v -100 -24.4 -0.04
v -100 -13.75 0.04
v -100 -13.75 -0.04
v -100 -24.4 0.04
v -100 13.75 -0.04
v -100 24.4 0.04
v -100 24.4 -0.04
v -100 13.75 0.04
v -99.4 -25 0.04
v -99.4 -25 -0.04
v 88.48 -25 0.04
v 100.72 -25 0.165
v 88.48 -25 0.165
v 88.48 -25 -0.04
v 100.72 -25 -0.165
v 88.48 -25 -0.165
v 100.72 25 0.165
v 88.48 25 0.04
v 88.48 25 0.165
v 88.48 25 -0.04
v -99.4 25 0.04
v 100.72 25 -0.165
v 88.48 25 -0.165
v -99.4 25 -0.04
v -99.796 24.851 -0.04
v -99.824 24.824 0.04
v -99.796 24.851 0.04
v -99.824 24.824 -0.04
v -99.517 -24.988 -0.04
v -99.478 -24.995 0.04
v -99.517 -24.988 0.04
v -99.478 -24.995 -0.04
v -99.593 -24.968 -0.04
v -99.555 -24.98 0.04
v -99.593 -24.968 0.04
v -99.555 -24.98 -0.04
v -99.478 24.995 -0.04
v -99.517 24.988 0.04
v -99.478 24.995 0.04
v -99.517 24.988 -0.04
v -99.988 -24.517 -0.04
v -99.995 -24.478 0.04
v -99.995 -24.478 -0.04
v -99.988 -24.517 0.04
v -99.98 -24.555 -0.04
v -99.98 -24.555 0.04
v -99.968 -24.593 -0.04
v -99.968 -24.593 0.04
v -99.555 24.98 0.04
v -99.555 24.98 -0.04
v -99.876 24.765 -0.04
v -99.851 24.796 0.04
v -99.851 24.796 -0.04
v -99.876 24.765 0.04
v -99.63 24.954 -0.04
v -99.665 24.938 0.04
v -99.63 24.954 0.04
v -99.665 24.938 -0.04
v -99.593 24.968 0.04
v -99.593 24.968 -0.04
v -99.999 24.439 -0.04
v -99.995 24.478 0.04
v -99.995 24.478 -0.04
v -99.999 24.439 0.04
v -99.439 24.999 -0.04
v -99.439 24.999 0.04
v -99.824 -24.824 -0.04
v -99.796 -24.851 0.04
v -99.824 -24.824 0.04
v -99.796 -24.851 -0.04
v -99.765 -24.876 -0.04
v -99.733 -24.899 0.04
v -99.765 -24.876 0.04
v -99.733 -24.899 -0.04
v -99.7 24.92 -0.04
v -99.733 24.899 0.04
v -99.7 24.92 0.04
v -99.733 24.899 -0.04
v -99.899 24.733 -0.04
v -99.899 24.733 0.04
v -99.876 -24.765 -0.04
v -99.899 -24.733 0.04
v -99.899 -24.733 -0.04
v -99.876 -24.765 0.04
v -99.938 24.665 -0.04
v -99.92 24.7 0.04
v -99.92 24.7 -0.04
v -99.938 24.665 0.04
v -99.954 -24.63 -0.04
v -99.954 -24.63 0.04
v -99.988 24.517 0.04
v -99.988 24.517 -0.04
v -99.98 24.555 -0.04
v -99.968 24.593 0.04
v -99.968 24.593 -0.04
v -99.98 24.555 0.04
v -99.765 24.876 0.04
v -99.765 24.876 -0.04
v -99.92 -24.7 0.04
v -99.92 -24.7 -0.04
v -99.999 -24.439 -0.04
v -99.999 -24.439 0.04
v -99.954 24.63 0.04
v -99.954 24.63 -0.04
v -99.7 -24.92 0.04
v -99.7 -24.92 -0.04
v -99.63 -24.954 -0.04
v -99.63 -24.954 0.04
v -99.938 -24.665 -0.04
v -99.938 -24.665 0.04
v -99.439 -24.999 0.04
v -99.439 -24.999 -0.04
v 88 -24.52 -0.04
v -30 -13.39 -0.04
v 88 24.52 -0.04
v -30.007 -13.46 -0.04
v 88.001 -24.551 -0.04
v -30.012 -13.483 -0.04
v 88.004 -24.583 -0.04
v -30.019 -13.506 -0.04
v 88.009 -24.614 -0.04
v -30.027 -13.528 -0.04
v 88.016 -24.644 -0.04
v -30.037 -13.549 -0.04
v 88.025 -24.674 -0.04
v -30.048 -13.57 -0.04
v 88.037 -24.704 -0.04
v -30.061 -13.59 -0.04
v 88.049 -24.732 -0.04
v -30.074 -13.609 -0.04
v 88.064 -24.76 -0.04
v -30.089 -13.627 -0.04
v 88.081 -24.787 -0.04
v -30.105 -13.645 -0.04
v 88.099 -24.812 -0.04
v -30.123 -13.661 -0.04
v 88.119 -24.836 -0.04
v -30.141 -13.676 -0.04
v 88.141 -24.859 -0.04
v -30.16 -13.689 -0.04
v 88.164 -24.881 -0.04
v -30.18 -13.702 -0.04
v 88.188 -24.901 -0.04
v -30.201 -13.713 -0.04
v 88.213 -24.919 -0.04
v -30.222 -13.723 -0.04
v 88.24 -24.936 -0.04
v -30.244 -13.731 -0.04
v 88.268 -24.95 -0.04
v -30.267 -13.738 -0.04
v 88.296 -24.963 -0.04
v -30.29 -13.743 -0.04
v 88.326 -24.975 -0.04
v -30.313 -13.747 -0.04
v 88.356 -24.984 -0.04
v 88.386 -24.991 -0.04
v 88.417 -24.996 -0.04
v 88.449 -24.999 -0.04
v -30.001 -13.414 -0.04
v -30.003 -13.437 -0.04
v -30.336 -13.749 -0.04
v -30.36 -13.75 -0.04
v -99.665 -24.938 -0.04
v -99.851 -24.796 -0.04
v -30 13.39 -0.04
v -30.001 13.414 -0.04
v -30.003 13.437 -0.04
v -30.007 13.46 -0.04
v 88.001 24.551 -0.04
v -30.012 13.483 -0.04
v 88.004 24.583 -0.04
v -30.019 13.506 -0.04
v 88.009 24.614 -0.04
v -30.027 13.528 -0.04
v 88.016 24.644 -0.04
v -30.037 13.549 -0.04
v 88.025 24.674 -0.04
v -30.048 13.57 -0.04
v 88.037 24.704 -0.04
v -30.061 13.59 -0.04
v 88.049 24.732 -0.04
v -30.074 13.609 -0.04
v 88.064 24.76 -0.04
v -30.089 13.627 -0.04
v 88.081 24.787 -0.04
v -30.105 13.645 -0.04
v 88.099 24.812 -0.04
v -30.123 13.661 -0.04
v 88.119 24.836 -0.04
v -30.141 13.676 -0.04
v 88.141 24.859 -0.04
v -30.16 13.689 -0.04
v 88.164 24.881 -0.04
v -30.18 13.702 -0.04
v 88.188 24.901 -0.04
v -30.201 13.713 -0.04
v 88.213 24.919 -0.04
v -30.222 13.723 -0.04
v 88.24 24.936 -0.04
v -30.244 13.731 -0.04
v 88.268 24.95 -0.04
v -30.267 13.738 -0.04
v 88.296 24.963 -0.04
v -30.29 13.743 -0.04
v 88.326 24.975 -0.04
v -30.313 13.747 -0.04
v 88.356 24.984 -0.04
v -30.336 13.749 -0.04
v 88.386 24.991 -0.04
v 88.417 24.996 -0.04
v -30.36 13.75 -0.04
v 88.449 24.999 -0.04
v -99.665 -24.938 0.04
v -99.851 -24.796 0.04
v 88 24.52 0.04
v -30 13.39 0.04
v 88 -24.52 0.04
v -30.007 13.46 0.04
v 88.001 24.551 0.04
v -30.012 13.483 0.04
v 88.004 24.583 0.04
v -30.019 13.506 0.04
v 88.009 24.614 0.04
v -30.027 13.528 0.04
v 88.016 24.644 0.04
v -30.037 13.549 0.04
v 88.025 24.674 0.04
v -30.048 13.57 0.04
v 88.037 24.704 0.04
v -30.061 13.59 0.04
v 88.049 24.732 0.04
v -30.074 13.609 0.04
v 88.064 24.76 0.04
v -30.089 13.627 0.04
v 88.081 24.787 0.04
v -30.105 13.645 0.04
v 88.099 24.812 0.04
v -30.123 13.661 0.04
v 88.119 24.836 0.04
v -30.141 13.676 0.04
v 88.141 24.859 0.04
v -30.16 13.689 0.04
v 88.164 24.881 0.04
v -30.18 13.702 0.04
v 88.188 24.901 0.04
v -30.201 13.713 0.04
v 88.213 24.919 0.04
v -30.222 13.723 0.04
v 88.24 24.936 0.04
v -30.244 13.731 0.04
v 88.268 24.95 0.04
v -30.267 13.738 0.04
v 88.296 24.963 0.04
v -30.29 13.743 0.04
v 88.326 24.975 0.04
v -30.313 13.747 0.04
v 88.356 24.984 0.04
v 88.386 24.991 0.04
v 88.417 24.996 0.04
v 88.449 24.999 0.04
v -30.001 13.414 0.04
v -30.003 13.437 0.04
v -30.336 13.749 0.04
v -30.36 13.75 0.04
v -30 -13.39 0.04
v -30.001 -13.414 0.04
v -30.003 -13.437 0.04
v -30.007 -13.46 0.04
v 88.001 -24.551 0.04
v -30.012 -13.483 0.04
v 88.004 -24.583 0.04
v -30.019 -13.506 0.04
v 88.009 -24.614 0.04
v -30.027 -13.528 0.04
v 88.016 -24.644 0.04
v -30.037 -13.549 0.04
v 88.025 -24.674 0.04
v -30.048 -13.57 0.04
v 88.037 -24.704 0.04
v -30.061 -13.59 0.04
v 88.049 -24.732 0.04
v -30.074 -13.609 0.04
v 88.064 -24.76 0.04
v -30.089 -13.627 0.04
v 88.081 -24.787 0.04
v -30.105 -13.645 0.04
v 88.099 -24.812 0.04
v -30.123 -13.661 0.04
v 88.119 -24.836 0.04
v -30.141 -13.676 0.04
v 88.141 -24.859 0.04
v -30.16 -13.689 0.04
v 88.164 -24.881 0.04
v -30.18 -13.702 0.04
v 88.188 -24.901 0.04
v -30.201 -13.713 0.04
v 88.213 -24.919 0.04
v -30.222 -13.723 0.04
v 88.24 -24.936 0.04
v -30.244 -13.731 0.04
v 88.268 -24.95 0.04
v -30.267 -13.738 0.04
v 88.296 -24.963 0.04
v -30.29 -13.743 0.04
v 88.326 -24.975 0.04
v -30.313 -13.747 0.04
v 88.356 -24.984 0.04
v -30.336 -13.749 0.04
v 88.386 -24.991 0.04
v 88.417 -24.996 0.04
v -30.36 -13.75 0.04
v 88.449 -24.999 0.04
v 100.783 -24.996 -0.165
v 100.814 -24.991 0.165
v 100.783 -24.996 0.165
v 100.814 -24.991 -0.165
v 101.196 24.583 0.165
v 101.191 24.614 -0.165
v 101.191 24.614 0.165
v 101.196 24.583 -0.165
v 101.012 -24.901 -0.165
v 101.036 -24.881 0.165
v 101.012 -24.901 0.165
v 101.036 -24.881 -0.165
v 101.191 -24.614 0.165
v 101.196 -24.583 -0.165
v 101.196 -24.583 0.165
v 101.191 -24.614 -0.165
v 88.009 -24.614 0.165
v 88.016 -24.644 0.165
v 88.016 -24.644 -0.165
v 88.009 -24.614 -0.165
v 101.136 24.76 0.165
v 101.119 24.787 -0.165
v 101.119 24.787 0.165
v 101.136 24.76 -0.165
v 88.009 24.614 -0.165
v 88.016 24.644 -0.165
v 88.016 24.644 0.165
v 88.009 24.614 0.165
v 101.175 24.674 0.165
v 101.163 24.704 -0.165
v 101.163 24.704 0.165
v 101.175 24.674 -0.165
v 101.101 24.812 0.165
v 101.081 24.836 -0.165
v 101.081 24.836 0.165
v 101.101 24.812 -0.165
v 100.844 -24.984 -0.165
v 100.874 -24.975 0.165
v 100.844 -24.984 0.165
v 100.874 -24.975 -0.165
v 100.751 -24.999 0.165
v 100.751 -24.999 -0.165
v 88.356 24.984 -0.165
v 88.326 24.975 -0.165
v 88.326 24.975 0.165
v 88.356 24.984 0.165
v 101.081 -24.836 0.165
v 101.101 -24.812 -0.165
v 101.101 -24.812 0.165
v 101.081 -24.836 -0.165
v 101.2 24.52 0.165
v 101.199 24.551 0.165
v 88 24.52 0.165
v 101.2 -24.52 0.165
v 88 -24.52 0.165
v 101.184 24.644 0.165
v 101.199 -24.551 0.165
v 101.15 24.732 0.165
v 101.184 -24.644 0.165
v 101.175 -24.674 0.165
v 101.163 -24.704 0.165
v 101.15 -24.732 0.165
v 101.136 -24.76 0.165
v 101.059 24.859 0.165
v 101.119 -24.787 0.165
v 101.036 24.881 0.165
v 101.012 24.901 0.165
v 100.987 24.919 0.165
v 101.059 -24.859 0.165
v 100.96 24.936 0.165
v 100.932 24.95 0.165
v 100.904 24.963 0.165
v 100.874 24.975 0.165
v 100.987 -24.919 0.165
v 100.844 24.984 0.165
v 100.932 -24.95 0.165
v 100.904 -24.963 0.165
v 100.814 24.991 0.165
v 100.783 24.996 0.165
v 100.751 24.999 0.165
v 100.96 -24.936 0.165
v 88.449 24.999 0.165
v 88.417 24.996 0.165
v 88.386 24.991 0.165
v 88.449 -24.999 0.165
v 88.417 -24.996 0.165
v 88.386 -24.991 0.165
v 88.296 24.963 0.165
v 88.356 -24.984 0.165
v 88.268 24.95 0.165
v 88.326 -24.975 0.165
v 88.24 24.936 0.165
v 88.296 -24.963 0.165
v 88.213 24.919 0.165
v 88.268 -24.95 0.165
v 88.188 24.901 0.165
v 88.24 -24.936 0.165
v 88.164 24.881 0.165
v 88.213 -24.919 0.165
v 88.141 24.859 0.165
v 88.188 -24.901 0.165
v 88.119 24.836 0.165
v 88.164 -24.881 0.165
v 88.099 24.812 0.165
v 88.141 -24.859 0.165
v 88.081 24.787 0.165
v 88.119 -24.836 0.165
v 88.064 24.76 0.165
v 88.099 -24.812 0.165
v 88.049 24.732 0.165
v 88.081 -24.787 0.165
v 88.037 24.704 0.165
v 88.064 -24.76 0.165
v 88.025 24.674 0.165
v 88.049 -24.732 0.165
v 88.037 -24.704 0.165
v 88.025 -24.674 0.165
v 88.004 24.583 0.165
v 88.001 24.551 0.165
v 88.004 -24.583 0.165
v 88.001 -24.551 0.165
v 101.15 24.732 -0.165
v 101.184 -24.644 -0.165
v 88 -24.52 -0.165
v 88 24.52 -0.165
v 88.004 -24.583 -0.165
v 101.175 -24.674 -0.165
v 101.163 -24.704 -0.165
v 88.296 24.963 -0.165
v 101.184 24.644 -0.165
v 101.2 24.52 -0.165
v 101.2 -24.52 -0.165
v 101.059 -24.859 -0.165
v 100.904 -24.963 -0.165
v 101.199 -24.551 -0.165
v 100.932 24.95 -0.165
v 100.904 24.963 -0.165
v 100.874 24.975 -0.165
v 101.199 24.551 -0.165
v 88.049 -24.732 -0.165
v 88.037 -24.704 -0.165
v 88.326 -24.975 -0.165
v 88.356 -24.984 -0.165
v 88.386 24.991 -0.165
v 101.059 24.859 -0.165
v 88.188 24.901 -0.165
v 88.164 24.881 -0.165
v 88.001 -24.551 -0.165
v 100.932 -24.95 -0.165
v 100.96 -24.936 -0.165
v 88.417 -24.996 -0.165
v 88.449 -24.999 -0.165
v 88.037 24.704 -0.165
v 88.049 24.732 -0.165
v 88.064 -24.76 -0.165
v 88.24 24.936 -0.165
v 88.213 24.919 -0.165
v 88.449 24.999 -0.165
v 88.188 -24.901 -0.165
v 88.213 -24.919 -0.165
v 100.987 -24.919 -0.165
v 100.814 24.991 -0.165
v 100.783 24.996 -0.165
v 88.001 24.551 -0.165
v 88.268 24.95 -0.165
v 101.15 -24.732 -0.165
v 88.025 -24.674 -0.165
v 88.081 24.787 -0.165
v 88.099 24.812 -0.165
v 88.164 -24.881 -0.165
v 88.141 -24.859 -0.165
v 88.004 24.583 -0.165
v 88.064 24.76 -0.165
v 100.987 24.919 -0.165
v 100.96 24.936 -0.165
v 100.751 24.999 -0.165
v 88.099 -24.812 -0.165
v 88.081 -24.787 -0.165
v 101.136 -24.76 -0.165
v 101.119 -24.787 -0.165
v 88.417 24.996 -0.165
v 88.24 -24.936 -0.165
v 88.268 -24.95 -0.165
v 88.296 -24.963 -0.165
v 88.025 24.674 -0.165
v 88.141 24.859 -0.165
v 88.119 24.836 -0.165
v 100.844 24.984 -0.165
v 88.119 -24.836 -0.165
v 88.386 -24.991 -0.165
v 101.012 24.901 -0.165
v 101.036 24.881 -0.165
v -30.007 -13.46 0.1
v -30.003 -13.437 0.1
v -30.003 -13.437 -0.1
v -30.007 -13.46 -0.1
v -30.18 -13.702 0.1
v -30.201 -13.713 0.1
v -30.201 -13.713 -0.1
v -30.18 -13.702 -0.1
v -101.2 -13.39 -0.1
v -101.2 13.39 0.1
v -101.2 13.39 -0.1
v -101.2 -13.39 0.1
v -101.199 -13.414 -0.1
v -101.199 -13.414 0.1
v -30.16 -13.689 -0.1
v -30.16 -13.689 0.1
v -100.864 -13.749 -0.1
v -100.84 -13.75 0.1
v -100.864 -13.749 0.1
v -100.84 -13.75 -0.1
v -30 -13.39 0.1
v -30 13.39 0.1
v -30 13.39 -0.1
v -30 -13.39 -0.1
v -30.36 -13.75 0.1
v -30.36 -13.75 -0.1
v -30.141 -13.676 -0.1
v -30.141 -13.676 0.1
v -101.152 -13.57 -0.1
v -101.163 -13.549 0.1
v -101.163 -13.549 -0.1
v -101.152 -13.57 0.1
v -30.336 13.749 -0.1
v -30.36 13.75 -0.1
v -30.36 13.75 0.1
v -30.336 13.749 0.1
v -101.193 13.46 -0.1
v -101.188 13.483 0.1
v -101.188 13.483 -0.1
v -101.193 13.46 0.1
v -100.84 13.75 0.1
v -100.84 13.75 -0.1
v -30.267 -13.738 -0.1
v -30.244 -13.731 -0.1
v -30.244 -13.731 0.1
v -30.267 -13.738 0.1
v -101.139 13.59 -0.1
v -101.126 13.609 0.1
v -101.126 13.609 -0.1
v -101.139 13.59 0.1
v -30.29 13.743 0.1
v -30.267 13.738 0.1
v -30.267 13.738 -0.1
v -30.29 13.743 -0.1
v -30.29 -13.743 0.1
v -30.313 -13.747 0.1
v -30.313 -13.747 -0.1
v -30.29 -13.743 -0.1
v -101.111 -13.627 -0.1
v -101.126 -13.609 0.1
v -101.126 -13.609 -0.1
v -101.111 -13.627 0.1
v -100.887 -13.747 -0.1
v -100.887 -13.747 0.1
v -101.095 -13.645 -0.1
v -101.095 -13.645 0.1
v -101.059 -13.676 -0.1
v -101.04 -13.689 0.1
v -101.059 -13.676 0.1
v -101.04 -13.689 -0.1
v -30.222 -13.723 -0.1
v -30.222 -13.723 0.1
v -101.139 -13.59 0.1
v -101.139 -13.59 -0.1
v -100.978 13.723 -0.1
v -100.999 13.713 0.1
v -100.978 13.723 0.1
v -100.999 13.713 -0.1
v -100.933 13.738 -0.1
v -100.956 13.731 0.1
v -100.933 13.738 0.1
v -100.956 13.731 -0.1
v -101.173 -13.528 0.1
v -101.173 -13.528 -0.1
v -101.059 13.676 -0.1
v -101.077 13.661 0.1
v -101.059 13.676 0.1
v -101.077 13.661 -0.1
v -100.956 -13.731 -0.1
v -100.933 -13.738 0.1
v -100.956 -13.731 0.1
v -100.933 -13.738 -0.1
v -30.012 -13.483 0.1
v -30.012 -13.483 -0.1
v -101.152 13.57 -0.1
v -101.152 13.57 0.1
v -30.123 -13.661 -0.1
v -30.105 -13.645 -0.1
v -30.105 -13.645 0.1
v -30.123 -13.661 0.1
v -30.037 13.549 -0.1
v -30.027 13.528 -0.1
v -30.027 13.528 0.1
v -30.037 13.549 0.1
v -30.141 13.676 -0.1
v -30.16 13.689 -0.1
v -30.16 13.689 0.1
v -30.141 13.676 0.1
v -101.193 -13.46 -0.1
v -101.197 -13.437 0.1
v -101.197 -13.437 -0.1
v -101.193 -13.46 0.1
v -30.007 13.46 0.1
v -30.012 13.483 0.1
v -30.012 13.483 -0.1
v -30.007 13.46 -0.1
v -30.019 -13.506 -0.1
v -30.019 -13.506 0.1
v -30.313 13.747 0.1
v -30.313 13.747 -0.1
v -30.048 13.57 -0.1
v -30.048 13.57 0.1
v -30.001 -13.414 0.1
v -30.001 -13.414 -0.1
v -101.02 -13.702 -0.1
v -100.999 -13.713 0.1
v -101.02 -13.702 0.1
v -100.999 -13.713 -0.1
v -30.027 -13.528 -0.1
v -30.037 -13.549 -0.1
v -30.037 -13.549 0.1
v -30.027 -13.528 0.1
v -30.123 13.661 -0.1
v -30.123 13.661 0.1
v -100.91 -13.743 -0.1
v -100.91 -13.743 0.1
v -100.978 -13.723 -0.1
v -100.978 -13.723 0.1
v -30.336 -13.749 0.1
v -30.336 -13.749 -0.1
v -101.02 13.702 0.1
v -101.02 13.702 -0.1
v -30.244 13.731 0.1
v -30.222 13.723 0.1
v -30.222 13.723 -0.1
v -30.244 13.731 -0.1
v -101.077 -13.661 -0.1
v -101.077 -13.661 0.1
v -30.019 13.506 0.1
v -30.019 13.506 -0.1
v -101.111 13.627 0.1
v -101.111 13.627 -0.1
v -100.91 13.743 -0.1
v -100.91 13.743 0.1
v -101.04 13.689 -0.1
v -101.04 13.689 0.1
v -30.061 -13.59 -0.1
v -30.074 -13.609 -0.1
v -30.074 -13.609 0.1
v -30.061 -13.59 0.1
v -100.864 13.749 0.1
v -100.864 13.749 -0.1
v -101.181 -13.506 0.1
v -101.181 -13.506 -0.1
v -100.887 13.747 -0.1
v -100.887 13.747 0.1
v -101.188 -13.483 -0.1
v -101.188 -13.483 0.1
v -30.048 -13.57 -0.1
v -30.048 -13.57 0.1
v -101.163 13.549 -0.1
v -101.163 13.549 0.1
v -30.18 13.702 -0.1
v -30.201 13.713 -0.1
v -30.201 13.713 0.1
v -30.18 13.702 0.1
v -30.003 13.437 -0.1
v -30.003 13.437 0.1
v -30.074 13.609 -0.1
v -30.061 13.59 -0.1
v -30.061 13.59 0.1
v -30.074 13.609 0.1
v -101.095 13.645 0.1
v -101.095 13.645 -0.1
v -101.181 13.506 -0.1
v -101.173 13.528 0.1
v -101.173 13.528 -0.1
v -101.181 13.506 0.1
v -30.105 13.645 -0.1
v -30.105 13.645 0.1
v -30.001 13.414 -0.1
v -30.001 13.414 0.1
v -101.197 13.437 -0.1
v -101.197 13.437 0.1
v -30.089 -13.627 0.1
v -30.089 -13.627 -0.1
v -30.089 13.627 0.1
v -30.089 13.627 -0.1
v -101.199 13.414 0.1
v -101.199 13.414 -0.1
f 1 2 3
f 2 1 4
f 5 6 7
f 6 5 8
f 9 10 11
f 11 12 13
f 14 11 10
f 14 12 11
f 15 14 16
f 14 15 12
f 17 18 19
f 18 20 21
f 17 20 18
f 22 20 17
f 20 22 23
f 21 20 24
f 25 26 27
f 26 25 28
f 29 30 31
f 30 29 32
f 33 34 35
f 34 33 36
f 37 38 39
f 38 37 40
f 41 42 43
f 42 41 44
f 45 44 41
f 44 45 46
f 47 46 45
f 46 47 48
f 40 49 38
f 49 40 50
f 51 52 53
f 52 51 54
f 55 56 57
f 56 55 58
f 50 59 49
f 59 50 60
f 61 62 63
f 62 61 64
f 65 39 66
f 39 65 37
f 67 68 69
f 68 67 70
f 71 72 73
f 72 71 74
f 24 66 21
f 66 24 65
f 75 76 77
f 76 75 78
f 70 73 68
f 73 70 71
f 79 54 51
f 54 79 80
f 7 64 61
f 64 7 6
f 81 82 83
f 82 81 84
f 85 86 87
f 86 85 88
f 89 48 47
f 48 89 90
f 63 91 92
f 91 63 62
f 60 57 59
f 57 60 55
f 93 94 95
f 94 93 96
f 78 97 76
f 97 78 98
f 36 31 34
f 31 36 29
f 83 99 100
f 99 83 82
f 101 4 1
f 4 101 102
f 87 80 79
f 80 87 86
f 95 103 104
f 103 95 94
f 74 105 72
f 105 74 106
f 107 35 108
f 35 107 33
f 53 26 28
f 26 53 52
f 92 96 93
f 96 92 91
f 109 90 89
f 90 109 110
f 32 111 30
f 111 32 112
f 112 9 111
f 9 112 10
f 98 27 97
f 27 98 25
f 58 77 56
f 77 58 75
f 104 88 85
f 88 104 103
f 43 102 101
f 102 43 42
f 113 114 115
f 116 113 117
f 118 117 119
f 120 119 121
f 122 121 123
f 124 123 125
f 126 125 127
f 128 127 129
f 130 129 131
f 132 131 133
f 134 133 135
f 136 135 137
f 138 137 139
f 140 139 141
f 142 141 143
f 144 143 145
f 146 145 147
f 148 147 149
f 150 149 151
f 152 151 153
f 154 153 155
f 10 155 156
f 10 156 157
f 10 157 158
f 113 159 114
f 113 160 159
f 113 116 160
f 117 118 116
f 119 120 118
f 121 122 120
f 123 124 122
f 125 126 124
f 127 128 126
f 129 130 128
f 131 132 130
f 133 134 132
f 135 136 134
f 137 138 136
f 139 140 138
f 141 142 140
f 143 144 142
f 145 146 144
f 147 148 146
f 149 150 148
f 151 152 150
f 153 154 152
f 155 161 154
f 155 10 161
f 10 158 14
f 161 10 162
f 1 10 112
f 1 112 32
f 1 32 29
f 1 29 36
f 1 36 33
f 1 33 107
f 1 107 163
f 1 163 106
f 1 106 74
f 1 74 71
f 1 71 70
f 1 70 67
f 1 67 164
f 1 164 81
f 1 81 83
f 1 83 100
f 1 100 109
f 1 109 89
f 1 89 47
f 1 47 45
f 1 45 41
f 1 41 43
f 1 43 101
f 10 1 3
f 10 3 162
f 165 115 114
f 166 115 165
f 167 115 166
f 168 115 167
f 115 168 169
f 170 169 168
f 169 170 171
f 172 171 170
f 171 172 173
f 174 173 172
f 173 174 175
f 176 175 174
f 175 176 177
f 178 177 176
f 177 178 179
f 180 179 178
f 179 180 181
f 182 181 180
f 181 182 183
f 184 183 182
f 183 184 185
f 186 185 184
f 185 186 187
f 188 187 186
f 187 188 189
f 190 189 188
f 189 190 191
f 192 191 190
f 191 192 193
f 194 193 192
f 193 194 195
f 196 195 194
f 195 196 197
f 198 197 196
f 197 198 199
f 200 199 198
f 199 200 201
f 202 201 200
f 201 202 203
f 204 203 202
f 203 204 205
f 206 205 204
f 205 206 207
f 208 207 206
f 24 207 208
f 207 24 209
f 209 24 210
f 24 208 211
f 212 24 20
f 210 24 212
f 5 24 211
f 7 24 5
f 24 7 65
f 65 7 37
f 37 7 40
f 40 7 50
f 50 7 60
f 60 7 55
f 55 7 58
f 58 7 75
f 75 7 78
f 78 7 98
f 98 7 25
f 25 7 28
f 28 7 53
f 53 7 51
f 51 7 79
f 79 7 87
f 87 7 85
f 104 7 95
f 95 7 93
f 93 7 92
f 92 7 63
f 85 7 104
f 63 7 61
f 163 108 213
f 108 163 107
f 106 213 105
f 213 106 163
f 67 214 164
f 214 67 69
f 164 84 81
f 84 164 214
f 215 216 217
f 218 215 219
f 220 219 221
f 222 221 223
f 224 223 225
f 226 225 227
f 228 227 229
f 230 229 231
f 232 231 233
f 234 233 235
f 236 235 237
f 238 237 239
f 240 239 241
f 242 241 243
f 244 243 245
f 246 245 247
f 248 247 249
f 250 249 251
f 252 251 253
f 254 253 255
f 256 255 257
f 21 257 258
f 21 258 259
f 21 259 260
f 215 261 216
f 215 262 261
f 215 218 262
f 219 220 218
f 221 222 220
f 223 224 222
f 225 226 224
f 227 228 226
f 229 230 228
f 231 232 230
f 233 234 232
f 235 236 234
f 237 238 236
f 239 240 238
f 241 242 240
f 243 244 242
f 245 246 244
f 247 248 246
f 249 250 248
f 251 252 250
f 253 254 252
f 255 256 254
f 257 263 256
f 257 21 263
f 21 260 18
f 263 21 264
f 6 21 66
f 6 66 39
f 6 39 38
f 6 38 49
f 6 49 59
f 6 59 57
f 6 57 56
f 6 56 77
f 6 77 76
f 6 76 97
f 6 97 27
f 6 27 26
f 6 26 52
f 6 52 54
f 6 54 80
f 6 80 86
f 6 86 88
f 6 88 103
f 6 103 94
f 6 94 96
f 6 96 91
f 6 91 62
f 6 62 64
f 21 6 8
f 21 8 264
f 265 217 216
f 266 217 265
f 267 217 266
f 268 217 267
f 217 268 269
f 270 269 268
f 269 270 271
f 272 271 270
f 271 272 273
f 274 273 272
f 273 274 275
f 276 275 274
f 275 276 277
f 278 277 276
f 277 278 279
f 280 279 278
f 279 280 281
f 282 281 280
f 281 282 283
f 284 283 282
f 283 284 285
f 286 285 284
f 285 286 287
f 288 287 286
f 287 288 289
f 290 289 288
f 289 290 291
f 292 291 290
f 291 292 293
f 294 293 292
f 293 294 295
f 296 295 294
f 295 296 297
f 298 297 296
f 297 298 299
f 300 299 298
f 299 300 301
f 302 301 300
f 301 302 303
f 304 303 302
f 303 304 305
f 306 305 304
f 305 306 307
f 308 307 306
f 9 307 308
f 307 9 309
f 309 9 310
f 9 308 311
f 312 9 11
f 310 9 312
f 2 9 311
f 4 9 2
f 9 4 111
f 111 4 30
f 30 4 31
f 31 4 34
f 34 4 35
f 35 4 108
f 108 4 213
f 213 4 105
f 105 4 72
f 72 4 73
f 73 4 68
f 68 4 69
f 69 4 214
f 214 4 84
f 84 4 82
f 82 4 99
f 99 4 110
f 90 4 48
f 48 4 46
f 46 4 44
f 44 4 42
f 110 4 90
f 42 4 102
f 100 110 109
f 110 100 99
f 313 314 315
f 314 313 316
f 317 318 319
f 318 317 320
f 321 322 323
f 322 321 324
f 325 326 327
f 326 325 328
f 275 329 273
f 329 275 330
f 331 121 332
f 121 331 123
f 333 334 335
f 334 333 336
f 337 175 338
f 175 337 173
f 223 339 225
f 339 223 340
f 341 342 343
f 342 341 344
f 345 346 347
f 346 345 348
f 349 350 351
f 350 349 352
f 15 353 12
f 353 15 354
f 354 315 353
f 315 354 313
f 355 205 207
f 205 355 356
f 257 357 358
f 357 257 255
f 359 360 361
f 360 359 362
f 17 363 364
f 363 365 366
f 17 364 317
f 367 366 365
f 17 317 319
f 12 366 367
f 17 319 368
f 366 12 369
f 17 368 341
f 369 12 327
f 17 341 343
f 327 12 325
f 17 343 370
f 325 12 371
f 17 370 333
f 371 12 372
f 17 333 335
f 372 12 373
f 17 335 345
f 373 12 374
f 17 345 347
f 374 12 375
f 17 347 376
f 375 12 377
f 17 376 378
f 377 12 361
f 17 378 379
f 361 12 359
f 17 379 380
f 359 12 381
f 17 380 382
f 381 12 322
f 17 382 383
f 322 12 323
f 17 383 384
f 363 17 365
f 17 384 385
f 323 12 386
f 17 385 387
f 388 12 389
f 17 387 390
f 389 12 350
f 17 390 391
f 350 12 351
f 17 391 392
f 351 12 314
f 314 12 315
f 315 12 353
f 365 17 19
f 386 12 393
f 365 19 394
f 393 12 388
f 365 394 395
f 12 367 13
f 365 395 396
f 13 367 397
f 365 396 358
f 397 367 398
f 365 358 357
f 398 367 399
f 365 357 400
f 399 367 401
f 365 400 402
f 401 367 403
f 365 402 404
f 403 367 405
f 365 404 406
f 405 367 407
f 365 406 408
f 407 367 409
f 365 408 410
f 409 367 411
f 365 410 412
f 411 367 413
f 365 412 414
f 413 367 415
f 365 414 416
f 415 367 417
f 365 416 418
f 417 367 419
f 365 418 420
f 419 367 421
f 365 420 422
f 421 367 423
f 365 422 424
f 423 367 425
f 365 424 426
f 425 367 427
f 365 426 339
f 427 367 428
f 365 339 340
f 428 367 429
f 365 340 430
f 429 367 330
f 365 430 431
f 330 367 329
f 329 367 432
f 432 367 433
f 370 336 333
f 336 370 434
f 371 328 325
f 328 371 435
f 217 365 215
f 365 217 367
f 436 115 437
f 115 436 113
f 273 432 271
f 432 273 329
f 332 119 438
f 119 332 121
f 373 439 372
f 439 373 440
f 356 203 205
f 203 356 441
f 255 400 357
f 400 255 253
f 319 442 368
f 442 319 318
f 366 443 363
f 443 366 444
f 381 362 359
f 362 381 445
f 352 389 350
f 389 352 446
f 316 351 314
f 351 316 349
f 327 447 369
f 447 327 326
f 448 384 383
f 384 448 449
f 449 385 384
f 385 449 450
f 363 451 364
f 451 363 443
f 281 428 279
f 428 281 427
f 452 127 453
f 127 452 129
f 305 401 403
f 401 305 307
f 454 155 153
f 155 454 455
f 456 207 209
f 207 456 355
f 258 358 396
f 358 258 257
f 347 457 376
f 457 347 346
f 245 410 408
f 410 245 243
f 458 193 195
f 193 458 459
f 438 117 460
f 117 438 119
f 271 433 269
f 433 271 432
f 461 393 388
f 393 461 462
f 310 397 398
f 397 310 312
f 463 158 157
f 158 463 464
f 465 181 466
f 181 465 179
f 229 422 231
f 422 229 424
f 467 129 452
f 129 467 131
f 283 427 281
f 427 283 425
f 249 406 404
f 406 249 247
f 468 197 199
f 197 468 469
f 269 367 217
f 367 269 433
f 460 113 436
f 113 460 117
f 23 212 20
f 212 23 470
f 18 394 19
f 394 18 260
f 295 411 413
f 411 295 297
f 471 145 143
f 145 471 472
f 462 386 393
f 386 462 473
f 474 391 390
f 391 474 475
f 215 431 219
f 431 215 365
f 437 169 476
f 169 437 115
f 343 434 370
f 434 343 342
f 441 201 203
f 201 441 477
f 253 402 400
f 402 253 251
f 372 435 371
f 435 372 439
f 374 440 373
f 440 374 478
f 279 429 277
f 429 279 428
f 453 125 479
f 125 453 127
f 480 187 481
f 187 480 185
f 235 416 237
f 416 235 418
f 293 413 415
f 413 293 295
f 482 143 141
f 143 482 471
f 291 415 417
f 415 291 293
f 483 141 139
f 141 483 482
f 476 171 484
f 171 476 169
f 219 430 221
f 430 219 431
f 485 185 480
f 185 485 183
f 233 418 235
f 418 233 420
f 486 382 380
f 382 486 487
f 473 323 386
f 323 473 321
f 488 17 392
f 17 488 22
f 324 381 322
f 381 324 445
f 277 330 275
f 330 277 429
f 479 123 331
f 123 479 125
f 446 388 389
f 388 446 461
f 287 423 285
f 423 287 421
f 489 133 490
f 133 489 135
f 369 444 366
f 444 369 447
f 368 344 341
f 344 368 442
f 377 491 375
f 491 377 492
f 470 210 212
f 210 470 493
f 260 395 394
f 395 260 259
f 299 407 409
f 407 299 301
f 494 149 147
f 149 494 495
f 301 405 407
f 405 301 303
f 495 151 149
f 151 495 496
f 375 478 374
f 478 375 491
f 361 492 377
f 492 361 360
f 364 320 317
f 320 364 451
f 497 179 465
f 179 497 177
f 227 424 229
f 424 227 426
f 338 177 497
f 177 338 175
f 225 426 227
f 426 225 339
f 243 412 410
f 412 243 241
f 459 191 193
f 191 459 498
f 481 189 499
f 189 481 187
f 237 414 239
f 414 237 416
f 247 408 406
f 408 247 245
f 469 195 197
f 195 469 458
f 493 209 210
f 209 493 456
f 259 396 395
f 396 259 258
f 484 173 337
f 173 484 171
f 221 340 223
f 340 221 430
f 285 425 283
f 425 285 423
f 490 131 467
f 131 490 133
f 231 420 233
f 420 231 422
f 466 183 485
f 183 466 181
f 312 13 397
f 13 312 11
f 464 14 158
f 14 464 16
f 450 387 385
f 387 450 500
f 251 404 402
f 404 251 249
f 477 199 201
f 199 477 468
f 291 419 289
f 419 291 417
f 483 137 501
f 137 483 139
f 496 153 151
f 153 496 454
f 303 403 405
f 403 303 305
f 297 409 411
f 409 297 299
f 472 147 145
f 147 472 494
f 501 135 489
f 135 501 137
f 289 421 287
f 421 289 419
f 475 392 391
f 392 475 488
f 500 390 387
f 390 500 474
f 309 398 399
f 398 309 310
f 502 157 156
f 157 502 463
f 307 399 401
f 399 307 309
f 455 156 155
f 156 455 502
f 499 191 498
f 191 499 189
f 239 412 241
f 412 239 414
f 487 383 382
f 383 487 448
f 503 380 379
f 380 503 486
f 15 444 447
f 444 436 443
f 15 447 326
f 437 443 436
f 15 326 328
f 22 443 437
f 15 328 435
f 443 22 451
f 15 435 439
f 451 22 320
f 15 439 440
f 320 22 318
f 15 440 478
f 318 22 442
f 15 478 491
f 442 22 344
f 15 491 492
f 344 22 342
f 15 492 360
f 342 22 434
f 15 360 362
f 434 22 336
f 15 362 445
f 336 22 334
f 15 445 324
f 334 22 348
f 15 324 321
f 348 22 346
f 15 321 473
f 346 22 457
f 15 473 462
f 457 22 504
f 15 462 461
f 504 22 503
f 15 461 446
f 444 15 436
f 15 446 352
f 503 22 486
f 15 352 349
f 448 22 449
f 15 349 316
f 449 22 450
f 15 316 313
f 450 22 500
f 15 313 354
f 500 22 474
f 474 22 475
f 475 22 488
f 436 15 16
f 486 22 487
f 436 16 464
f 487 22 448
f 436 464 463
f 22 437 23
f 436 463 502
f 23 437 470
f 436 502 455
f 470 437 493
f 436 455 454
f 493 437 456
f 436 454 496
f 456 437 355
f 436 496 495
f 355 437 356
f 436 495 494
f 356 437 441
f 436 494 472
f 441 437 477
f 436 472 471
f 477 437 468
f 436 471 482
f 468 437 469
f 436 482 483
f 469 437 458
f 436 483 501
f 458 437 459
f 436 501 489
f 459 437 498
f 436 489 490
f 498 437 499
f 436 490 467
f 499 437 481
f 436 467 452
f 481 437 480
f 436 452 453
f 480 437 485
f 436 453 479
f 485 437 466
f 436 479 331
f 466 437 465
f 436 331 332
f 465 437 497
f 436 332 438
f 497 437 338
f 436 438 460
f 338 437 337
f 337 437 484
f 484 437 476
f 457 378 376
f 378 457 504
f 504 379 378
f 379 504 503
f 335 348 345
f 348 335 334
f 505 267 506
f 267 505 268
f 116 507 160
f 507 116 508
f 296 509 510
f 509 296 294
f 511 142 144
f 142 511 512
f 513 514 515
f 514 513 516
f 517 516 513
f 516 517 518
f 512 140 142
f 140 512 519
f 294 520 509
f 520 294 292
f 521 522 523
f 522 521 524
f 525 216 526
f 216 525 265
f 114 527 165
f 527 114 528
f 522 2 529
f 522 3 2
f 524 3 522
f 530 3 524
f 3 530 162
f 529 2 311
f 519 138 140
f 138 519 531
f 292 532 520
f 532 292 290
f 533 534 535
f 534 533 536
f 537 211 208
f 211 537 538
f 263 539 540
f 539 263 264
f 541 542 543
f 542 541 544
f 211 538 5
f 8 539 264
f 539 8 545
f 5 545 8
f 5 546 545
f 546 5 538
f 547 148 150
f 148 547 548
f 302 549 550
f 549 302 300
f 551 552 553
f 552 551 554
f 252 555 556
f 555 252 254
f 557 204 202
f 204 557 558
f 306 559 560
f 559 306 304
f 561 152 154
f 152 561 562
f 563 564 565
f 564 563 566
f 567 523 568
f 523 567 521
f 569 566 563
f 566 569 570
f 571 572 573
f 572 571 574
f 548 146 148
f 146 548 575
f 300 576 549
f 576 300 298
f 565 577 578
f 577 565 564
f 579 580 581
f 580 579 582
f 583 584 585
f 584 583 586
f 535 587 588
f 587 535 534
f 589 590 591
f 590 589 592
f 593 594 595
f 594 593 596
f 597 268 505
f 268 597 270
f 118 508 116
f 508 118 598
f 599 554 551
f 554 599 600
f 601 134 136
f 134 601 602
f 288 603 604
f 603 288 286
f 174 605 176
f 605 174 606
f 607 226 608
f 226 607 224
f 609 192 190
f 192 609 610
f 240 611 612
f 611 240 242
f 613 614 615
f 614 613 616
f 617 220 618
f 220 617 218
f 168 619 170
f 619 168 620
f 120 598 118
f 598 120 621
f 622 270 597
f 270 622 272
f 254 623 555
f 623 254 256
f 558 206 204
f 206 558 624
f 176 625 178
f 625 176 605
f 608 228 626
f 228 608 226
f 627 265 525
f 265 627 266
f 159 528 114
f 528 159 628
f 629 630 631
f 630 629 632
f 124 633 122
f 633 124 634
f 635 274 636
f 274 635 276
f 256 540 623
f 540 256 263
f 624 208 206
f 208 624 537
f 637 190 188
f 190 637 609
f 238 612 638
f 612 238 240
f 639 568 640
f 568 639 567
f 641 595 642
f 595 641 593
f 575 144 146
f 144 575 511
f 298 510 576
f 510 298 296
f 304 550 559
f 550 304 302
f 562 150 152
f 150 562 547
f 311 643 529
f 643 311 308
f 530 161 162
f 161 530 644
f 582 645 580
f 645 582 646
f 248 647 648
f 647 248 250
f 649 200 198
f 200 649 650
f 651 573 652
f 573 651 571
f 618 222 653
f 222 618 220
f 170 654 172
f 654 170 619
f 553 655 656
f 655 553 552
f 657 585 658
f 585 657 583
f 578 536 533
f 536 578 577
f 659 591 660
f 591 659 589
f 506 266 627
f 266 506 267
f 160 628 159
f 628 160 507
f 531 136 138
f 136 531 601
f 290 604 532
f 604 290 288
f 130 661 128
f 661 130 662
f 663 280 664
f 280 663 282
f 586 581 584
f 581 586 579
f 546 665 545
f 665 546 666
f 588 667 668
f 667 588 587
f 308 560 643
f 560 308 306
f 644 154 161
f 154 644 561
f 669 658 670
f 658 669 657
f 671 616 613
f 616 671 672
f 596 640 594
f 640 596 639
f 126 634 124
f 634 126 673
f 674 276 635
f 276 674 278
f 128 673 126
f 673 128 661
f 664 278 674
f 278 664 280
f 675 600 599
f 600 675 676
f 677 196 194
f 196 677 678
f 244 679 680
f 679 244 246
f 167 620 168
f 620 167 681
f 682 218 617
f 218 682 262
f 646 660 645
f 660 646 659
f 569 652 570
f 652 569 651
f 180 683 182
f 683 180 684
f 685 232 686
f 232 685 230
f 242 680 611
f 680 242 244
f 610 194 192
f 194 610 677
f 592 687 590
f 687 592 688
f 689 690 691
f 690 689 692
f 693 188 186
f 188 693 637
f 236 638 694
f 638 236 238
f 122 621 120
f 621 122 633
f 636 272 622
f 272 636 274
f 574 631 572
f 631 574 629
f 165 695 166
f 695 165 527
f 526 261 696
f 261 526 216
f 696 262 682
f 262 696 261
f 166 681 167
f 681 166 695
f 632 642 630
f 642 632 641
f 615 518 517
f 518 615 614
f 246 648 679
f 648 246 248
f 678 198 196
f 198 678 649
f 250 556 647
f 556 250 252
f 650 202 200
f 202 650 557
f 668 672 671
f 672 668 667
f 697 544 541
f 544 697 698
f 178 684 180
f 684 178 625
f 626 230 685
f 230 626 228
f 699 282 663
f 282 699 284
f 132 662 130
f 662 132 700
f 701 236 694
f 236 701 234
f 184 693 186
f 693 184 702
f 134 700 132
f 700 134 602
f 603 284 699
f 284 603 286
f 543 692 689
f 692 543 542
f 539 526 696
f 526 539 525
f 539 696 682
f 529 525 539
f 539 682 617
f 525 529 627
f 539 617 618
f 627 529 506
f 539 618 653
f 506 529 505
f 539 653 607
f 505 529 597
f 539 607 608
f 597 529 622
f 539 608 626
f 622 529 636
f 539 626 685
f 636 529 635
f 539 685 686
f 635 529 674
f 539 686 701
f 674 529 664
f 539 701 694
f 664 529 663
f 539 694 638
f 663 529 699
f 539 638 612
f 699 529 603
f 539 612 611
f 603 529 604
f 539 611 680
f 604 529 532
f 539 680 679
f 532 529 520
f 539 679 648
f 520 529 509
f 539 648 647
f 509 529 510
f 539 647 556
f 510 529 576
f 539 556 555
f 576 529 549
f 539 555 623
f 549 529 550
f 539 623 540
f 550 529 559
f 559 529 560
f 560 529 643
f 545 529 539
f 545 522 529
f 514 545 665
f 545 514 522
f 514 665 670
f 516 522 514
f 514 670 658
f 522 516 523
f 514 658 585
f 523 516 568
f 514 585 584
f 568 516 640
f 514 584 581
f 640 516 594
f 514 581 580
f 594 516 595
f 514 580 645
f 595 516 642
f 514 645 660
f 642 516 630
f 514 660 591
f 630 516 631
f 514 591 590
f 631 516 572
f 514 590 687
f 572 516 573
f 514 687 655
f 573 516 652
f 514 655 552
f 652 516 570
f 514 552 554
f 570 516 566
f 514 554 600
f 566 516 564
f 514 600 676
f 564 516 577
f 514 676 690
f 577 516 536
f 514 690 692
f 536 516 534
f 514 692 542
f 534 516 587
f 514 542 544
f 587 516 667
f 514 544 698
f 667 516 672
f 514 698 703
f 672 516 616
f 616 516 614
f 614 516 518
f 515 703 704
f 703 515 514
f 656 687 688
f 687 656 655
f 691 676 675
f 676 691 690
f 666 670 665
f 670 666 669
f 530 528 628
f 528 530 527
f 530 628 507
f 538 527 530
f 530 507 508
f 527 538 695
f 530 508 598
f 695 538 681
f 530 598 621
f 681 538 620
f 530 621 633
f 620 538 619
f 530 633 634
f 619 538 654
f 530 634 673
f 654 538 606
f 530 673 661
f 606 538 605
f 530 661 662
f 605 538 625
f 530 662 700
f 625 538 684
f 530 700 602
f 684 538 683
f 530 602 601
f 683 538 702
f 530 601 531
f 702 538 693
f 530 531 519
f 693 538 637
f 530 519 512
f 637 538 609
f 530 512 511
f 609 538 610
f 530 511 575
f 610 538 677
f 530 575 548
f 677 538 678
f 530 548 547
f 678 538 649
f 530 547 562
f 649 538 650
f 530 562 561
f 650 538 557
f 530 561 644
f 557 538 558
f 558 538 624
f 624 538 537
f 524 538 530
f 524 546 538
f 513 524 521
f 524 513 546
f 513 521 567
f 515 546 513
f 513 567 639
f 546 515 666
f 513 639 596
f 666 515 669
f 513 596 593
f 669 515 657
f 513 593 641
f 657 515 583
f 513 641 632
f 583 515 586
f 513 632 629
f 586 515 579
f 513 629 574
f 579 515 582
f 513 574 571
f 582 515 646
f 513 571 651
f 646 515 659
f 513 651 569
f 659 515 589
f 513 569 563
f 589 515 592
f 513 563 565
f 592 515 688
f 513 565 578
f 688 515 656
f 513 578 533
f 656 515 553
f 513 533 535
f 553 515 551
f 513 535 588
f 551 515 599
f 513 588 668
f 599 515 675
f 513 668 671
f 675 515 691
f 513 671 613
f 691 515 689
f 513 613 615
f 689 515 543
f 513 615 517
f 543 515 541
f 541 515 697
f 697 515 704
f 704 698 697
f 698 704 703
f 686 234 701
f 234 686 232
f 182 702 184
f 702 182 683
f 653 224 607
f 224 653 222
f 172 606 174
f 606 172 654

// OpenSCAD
$fn = 96;

// A sheet: Aluminium foil tape (single connected solid)
// Replaces roll/spool with a thin rectangular sheet/strip of foil tape.

//////////////////////
// User parameters
//////////////////////
tape_width      = 50;    // mm (across the tape)
tape_length     = 200;   // mm (along the tape)
tape_thickness  = 0.08;  // mm (foil tape thickness, visual)
edge_chamfer    = 0.6;   // mm (softened edges, simplified)
overlap         = 1.2;   // mm (intentional overlap to ensure watertight union)

//////////////////////
// Helpers
//////////////////////
module rounded_sheet(L, W, T, r) {
    // Simple rounded-rectangle prism using hull of corner cylinders.
    // Ensures a clean sheet silhouette without fine details.
    rr = min(r, W/2 - 0.01, L/2 - 0.01);
    hull() {
        for (sx = [-1, 1], sy = [-1, 1]) {
            translate([sx*(L/2 - rr), sy*(W/2 - rr), 0])
                cylinder(r=rr, h=T, center=true);
        }
    }
}

module foil_tape_sheet() {
    // Main sheet body
    rounded_sheet(tape_length, tape_width, tape_thickness, edge_chamfer);

    // Slightly thicker "folded/raised" leading edge to read as foil tape sheet
    // Connected by overlap (no floating parts).
    lip_len = max(8, tape_length * 0.06);
    lip_thk = tape_thickness + 0.25; // subtle raised edge
    translate([tape_length/2 - lip_len/2 + overlap/2, 0, 0])
        rounded_sheet(lip_len + overlap, tape_width, lip_thk, edge_chamfer*0.8);

    // Subtle backing/adhesive hint as a shallow band on the underside (still one solid)
    // Implemented as a very thin rib that overlaps into the main sheet.
    band_len = tape_length * 0.35;
    band_w   = tape_width * 0.55;
    band_thk = tape_thickness + 0.12;
    translate([-tape_length/2 + band_len/2 - overlap/2, 0, 0])
        rounded_sheet(band_len + overlap, band_w, band_thk, edge_chamfer*0.6);
}

//////////////////////
// Render
//////////////////////
color([0.82, 0.82, 0.80])
union() {
    foil_tape_sheet();
}
